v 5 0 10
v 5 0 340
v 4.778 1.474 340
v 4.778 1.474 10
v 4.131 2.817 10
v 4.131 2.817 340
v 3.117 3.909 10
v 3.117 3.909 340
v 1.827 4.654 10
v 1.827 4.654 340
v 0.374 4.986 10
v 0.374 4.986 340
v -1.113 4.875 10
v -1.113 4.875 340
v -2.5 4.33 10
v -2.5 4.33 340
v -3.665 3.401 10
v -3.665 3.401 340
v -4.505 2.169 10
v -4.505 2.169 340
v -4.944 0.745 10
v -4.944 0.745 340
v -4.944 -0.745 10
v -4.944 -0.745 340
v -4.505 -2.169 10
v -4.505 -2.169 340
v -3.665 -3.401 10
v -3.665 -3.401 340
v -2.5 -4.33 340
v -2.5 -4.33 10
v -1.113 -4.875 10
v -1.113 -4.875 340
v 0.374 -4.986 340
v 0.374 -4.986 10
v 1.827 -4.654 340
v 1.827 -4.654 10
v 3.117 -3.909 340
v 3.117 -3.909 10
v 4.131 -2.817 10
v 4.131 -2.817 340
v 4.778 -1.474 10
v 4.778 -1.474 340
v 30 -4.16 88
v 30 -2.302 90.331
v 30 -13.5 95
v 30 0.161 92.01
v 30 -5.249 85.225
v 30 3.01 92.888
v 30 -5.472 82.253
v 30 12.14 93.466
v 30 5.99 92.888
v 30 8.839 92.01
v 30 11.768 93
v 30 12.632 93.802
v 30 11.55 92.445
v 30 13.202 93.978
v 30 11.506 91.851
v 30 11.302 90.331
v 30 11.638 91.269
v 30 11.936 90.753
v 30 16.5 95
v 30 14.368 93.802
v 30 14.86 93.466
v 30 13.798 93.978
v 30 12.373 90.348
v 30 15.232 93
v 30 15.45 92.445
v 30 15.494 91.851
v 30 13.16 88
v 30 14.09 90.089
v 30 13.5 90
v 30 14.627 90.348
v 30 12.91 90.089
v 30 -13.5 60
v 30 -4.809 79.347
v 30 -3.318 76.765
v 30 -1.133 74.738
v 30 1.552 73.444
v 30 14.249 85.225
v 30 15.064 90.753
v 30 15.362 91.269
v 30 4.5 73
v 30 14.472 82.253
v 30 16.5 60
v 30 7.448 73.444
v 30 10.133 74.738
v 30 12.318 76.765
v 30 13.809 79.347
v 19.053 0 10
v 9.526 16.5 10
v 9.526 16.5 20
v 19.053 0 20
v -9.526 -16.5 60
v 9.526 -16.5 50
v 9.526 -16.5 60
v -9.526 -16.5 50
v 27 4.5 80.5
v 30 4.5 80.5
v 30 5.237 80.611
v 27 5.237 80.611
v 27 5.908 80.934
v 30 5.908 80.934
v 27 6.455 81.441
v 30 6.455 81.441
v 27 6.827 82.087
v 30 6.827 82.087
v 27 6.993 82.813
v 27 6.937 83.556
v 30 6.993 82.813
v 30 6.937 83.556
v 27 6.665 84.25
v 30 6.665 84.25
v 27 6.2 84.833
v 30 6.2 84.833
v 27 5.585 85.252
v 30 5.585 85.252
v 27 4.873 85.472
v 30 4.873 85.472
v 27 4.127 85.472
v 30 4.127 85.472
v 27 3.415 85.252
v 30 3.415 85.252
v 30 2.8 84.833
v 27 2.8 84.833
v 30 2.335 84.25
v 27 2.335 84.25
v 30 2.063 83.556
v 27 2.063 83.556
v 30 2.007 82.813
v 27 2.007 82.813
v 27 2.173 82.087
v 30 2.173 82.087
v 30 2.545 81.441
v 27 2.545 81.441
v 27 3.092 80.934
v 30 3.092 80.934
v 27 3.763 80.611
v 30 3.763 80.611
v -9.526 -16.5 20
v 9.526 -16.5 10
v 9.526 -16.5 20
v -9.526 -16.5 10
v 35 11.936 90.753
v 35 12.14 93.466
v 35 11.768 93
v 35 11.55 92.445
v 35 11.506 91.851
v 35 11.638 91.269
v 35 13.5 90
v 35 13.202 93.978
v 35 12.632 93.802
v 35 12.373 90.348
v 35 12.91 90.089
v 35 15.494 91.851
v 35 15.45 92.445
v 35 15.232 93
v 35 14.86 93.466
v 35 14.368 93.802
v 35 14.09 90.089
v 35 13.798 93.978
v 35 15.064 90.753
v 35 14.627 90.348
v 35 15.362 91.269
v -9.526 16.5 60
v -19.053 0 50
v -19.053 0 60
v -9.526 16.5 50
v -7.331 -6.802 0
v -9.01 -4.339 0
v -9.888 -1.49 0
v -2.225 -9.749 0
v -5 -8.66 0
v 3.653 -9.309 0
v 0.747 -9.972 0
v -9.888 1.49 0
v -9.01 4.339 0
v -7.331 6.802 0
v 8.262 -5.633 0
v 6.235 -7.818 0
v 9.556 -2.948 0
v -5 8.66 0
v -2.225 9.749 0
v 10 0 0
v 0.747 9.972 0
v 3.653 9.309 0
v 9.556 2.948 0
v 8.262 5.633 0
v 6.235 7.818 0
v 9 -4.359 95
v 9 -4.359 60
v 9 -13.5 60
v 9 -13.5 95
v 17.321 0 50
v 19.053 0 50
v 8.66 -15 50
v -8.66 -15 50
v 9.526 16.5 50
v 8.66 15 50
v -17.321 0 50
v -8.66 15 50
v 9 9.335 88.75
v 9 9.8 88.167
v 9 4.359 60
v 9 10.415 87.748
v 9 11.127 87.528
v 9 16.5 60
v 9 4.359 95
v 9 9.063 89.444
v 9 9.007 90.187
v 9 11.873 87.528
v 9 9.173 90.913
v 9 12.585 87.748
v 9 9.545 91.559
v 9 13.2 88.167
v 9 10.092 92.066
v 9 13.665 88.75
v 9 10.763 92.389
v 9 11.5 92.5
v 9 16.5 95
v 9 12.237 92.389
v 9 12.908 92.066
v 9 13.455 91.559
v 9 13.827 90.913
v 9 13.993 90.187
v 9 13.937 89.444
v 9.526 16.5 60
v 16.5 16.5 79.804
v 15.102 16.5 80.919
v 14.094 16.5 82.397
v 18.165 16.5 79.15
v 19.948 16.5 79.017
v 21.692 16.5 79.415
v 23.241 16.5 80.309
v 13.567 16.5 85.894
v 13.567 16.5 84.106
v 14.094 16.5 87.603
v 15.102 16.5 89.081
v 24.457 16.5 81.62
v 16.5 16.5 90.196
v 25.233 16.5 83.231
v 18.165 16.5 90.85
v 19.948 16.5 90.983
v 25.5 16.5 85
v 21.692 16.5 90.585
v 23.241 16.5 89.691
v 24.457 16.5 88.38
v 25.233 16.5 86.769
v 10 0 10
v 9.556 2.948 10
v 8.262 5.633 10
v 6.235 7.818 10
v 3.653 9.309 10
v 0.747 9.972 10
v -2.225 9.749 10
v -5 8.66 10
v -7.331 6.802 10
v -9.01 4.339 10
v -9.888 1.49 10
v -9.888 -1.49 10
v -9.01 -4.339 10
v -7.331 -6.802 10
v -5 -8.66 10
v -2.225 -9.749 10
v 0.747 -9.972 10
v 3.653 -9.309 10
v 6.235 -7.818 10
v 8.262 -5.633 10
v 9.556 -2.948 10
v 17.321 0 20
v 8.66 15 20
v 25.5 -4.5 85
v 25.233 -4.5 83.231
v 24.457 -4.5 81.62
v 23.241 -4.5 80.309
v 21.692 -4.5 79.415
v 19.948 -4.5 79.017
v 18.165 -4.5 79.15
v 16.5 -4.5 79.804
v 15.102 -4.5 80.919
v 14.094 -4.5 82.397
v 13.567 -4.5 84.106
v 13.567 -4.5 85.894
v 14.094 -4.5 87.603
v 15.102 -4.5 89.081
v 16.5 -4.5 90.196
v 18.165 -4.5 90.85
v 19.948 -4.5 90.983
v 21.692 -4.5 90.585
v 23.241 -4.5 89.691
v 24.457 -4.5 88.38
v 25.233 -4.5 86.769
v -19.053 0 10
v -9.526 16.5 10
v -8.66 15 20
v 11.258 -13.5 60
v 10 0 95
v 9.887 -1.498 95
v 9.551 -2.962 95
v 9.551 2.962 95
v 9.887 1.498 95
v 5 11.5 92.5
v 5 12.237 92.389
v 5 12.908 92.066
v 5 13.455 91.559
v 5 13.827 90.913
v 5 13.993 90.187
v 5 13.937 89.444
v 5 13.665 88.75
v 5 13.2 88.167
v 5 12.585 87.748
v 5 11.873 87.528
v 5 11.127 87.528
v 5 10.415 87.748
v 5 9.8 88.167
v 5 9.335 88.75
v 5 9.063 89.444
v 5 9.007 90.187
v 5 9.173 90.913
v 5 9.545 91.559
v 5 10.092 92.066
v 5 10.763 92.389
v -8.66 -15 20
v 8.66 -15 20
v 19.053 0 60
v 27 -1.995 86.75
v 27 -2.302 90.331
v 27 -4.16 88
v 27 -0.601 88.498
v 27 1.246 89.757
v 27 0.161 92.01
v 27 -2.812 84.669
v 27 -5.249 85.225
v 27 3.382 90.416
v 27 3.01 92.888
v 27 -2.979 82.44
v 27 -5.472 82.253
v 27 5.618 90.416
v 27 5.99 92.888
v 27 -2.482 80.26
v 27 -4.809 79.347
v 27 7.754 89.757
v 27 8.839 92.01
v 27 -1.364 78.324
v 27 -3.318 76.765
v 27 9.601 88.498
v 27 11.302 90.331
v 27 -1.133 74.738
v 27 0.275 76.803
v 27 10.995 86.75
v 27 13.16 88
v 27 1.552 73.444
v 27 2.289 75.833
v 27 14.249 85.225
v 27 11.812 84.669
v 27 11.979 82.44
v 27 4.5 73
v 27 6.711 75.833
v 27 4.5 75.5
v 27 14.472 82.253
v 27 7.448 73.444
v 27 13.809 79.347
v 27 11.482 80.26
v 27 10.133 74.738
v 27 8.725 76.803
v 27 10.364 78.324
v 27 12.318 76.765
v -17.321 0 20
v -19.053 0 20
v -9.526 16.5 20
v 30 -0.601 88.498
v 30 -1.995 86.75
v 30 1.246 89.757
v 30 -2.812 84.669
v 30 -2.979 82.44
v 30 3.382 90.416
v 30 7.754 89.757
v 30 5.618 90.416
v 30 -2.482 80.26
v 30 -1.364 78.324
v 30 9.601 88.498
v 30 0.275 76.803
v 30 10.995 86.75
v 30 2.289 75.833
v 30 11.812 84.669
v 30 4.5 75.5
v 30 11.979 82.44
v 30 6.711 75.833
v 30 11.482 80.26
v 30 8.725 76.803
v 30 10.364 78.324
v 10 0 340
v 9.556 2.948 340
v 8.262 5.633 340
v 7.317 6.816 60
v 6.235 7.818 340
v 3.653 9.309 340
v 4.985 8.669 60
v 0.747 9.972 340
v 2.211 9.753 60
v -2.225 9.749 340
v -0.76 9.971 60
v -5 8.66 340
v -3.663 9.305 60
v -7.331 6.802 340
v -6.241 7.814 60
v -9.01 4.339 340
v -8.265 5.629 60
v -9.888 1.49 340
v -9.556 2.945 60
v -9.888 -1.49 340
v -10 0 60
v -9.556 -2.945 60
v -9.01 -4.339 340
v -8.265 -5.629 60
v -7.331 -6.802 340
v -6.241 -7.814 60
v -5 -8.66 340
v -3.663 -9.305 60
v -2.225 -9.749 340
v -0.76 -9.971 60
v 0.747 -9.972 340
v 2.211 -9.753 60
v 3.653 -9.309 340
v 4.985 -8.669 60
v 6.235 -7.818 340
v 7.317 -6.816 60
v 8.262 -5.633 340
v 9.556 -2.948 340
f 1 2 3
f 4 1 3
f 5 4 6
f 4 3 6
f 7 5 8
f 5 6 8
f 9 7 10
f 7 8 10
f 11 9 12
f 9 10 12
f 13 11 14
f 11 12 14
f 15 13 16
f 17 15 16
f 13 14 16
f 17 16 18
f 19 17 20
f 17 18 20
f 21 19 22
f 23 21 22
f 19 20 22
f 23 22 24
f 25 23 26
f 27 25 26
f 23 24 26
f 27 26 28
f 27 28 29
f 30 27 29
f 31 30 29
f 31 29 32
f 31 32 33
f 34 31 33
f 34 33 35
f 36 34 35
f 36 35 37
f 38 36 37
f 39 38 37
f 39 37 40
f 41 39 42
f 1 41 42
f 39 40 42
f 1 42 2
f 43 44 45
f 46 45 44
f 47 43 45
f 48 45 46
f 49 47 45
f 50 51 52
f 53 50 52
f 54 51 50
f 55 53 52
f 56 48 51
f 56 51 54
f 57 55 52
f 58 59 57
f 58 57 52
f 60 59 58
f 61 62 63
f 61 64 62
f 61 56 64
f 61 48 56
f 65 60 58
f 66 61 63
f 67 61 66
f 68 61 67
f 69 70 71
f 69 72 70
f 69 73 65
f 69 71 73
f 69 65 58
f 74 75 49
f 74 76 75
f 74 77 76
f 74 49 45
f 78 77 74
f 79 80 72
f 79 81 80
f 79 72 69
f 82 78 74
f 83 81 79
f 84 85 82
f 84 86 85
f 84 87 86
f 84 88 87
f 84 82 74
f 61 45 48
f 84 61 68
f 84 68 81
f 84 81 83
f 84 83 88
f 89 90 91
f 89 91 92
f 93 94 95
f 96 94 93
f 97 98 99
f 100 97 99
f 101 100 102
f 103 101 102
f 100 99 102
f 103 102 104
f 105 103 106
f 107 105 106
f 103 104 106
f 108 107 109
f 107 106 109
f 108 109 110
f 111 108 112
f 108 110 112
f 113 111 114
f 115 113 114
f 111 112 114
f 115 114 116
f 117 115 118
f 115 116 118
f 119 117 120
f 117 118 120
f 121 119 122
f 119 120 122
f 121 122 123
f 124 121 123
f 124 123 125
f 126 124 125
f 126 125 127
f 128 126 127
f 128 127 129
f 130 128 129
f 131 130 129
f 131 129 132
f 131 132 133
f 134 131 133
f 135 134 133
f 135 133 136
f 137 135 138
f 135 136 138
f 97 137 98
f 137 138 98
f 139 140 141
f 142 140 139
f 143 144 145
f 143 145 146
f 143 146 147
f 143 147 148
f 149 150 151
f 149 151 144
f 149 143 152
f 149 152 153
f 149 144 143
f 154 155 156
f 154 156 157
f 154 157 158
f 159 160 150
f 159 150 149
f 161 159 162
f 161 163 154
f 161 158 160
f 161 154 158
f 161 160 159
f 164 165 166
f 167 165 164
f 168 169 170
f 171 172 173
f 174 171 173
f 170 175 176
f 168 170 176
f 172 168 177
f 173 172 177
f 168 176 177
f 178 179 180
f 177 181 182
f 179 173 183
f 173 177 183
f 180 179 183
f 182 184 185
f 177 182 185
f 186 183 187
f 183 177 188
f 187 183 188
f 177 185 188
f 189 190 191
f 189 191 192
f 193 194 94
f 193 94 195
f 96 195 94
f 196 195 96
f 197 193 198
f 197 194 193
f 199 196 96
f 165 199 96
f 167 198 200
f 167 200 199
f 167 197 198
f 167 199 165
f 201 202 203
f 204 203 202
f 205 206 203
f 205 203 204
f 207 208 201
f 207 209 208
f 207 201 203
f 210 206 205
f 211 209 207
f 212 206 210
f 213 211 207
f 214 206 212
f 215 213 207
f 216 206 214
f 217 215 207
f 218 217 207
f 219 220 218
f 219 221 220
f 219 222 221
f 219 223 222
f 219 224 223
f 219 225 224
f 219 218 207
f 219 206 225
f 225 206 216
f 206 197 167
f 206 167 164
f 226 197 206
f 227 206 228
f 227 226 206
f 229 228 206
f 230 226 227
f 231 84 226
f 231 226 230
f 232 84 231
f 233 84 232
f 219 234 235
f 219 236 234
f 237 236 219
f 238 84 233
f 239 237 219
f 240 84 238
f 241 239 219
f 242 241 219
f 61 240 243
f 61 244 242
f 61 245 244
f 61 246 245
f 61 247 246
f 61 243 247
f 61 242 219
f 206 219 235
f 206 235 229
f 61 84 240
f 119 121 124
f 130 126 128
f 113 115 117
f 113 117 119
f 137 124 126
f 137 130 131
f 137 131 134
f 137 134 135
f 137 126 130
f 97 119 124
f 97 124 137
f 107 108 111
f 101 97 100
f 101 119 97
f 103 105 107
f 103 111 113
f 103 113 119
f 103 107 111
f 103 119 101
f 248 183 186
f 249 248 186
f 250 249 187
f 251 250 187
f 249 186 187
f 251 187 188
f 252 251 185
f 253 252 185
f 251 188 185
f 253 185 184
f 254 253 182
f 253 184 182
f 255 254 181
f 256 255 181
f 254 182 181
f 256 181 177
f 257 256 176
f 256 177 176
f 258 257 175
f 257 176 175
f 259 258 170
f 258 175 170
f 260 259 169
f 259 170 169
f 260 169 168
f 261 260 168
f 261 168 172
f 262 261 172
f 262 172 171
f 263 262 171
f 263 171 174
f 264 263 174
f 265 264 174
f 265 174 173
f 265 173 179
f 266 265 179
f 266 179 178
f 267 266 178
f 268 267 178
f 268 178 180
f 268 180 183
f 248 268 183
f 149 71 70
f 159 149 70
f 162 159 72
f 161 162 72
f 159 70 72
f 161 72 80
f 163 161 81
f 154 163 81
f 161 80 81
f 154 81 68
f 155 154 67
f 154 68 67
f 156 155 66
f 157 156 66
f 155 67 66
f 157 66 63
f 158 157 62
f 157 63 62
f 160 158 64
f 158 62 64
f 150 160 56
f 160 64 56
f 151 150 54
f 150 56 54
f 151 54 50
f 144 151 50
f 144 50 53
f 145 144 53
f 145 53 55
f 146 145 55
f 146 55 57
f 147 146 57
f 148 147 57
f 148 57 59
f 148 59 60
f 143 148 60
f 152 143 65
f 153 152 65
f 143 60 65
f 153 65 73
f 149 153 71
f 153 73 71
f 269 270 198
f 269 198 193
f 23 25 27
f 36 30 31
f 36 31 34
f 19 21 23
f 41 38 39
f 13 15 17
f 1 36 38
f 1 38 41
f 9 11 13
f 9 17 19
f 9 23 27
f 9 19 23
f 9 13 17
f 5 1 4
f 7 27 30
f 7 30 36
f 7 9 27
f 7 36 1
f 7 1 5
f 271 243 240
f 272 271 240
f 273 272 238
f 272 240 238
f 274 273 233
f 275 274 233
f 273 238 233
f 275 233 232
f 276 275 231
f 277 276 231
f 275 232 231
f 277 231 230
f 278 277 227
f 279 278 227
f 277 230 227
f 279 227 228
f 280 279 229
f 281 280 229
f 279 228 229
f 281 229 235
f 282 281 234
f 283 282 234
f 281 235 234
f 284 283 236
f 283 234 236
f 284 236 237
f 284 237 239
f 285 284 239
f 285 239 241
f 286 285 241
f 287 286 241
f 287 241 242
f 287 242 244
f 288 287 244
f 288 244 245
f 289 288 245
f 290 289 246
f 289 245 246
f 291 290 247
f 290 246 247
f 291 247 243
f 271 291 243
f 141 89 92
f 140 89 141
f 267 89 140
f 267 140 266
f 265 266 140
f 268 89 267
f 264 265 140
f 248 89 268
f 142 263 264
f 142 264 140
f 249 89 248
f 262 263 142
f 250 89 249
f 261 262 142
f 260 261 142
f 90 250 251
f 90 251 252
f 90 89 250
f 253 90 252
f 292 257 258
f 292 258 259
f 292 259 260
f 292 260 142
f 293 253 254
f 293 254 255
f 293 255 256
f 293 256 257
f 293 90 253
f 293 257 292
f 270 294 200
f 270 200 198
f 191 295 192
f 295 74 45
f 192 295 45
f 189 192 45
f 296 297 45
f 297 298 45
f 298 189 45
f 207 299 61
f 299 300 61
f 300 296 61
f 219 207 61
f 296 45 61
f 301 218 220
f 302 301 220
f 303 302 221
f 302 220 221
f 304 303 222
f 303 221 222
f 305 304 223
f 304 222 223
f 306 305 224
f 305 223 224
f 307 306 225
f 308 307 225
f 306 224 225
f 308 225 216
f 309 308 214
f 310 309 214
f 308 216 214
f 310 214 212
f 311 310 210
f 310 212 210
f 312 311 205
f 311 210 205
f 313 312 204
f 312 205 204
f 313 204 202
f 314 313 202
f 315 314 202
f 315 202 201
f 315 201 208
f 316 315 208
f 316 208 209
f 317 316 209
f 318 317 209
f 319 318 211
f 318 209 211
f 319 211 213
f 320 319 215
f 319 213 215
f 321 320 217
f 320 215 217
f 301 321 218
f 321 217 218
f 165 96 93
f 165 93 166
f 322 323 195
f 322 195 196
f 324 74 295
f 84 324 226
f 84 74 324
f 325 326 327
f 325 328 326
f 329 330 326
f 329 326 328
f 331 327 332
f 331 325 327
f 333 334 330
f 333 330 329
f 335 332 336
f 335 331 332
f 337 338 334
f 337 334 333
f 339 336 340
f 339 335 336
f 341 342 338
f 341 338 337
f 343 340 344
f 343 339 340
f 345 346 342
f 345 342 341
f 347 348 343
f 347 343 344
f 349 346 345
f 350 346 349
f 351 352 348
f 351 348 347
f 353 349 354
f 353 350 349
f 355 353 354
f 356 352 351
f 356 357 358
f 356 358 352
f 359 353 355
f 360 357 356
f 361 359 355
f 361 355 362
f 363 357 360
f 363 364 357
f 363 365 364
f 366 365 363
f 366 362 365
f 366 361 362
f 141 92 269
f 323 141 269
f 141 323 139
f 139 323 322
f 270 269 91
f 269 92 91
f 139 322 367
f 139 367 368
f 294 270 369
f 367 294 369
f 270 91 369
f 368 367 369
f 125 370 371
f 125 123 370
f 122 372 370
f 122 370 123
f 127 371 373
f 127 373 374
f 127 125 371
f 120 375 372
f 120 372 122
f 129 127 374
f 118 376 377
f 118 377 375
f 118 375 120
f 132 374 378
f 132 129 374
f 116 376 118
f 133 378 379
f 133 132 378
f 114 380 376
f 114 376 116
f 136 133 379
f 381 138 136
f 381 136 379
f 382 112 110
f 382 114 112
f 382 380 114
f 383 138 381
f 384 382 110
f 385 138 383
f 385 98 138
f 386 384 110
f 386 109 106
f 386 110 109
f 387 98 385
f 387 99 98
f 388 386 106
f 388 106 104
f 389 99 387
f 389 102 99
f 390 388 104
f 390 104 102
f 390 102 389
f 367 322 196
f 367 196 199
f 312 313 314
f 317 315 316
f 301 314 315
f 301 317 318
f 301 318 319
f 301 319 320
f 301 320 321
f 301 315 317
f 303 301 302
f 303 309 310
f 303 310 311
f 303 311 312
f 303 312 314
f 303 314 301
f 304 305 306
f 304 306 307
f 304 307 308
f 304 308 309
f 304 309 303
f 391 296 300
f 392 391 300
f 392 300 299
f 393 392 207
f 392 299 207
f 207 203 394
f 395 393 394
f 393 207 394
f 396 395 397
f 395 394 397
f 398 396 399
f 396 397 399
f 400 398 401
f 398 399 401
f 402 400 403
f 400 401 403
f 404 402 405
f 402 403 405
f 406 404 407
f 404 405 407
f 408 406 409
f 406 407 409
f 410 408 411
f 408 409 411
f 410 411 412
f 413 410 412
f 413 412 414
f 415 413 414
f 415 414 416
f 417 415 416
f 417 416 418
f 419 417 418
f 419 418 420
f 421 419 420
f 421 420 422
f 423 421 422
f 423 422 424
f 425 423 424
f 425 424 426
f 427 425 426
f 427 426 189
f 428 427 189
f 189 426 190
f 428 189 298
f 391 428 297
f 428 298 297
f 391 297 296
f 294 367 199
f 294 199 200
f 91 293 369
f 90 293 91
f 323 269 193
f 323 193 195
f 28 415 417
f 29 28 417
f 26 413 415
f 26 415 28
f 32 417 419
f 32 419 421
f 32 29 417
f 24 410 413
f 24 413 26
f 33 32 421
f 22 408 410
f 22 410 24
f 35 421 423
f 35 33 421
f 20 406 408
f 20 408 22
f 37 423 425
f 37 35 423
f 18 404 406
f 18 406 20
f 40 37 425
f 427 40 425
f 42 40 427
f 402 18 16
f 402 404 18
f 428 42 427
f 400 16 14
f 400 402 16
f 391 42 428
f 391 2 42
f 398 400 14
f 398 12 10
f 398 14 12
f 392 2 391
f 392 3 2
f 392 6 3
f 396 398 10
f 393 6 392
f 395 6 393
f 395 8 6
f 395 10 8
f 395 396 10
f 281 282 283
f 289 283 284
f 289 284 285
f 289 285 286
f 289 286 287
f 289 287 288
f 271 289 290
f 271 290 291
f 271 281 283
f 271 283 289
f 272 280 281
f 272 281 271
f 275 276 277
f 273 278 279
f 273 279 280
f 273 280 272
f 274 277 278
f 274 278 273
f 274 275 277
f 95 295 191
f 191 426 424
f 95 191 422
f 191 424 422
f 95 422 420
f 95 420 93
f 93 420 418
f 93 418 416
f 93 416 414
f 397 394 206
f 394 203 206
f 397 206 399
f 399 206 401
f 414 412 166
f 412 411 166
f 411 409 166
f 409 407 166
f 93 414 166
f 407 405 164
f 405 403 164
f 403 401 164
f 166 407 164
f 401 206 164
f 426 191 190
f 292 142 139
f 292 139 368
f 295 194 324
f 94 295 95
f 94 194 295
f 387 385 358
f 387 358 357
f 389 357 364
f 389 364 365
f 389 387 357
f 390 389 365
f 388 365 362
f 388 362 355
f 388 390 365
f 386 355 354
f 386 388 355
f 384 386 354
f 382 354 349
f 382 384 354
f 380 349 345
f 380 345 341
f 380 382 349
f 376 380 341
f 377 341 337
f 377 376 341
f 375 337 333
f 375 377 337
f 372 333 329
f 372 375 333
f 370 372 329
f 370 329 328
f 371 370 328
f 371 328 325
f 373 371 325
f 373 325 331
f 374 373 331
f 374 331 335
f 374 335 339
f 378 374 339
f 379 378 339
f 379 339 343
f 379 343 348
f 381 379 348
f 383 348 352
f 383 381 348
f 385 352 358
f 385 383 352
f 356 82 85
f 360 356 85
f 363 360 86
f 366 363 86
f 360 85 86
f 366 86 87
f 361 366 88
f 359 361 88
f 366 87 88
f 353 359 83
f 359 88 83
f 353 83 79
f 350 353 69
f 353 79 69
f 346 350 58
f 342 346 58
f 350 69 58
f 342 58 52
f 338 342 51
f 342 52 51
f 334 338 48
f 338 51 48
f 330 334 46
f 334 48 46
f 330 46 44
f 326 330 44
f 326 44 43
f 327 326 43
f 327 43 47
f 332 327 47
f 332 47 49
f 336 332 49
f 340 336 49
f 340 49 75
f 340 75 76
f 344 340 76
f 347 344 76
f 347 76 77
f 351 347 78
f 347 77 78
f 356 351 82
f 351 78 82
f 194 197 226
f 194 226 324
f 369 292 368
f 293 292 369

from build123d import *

# Parameters (mm, degrees)
SKETCH1_R            = 10
BOSS_EXTRUDE1_DEPTH  = 340
SKETCH2_R            = 5
CUT_EXTRUDE1_DEPTH   = 330
BOSS_EXTRUDE2_START  = -10
SKETCH3_R            = 10
BOSS_EXTRUDE2_DEPTH  = 50
BOSS_EXTRUDE3_DEPTH  = 10
BOSS_EXTRUDE4_START  = -40
BOSS_EXTRUDE4_DEPTH  = 10
BOSS_EXTRUDE6_START  = 10
SKETCH5_W            = 35
SKETCH5_H            = 30
BOSS_EXTRUDE6_DEPTH  = 10
SKETCH6_W            = 35
SKETCH6_H            = 30
BOSS_EXTRUDE8_DEPTH  = 11
SKETCH7_R            = 6
CUT_EXTRUDE2_DEPTH   = 21
SKETCH8_R            = 2.5
BOSS_EXTRUDE9_DEPTH  = 4
SKETCH9_R            = 10
SKETCH9_R_2          = 7.5
SKETCH9_R_3          = 2.5
CUT_EXTRUDE3_DEPTH   = 3
SKETCH10_R           = 2
BOSS_EXTRUDE10_DEPTH = 5


with BuildPart() as part:
    # Sketch1 → Boss-Extrude1 (new body)
    with BuildSketch(Plane.XY):
        Circle(SKETCH1_R)
    extrude(amount=BOSS_EXTRUDE1_DEPTH)

    # Sketch2 → Cut-Extrude1 (cut)
    with BuildSketch(Plane.XY.offset(340)):
        Circle(SKETCH2_R)
    extrude(amount=-CUT_EXTRUDE1_DEPTH, mode=Mode.SUBTRACT)

    # Sketch3 → Boss-Extrude2 (add)
    with BuildSketch(Plane(origin=(0, 0, 0), x_dir=(-1, 0, 0), z_dir=(0, 0, -1)).offset(BOSS_EXTRUDE2_START)):
        Polygon((17.320508076, 0), (8.660254038, 15), (-8.660254038, 15), (-17.320508076, 0), (-8.660254038, -15), (8.660254038, -15), align=None)
        Circle(SKETCH3_R, mode=Mode.SUBTRACT)
    extrude(amount=-BOSS_EXTRUDE2_DEPTH)

    # Sketch4 → Boss-Extrude3 (add)
    with BuildSketch(Plane(origin=(0, 0, 10), x_dir=(-1, 0, 0), z_dir=(0, 0, -1))):
        Polygon((-9.526279442, -16.5), (9.526279442, -16.5), (19.052558883, 0), (9.526279442, 16.5), (-9.526279442, 16.5), (-19.052558883, 0), align=None)
        Polygon((8.660254038, 15), (-8.660254038, 15), (-17.320508076, 0), (-8.660254038, -15), (8.660254038, -15), (17.320508076, 0), align=None, mode=Mode.SUBTRACT)
    extrude(amount=-BOSS_EXTRUDE3_DEPTH)

    # Sketch4<2> → Boss-Extrude4 (add)
    with BuildSketch(Plane(origin=(0, 0, 10), x_dir=(-1, 0, 0), z_dir=(0, 0, -1)).offset(BOSS_EXTRUDE4_START)):
        Polygon((-9.526279442, -16.5), (9.526279442, -16.5), (19.052558883, 0), (9.526279442, 16.5), (-9.526279442, 16.5), (-19.052558883, 0), align=None)
        Polygon((8.660254038, 15), (-8.660254038, 15), (-17.320508076, 0), (-8.660254038, -15), (8.660254038, -15), (17.320508076, 0), align=None, mode=Mode.SUBTRACT)
    extrude(amount=-BOSS_EXTRUDE4_DEPTH)



with BuildPart() as body_2:
    # Sketch5 → Boss-Extrude6 (new body)
    with BuildSketch(Plane(origin=(10, 0, 0), x_dir=(0, 0, -1), z_dir=(1, 0, 0)).offset(BOSS_EXTRUDE6_START)):
        with Locations((-77.5, 1.5)):
            Rectangle(SKETCH5_W, SKETCH5_H)
    extrude(amount=BOSS_EXTRUDE6_DEPTH)


with BuildPart() as part_1:
    add(part.part)

    add(body_2.part)  # Boss-Extrude8 merges body 2
    # Sketch6 → Boss-Extrude8 (add)
    with BuildSketch(Plane.ZY.offset(-20)):
        with Locations((77.5, 1.5)):
            Rectangle(SKETCH6_W, SKETCH6_H)
    extrude(amount=BOSS_EXTRUDE8_DEPTH)

    # Sketch7 → Cut-Extrude2 (cut)
    with BuildSketch(Plane(origin=(0, 16.5, 0), x_dir=(1, 0, 0), z_dir=(0, 1, 0))):
        with Locations((19.5, -85)):
            Circle(SKETCH7_R)
    extrude(amount=-CUT_EXTRUDE2_DEPTH, mode=Mode.SUBTRACT)

    # Sketch8 → Boss-Extrude9 (add)
    with BuildSketch(Plane.ZY.offset(-9)):
        with Locations((90, 11.5)):
            Circle(SKETCH8_R)
    extrude(amount=BOSS_EXTRUDE9_DEPTH)

    # Sketch9 → Cut-Extrude3 (cut)
    # profile 1 of 2: a face of its own
    with BuildSketch(Plane(origin=(30, 0, 0), x_dir=(0, 0, -1), z_dir=(1, 0, 0))):
        with Locations((-83, 4.5)):
            Circle(SKETCH9_R)
        with Locations((-83, 4.5)):
            Circle(SKETCH9_R_2, mode=Mode.SUBTRACT)
    # profile 2 of 2: a face of its own
    with BuildSketch(Plane(origin=(30, 0, 0), x_dir=(0, 0, -1), z_dir=(1, 0, 0))):
        with Locations((-83, 4.5)):
            Circle(SKETCH9_R_3)
    extrude(amount=-CUT_EXTRUDE3_DEPTH, mode=Mode.SUBTRACT)

    # Sketch10 → Boss-Extrude10 (add)
    with BuildSketch(Plane(origin=(30, 0, 0), x_dir=(0, 0, -1), z_dir=(1, 0, 0))):
        with Locations((-92, 13.5)):
            Circle(SKETCH10_R)
    extrude(amount=BOSS_EXTRUDE10_DEPTH)


solid = part_1.part
